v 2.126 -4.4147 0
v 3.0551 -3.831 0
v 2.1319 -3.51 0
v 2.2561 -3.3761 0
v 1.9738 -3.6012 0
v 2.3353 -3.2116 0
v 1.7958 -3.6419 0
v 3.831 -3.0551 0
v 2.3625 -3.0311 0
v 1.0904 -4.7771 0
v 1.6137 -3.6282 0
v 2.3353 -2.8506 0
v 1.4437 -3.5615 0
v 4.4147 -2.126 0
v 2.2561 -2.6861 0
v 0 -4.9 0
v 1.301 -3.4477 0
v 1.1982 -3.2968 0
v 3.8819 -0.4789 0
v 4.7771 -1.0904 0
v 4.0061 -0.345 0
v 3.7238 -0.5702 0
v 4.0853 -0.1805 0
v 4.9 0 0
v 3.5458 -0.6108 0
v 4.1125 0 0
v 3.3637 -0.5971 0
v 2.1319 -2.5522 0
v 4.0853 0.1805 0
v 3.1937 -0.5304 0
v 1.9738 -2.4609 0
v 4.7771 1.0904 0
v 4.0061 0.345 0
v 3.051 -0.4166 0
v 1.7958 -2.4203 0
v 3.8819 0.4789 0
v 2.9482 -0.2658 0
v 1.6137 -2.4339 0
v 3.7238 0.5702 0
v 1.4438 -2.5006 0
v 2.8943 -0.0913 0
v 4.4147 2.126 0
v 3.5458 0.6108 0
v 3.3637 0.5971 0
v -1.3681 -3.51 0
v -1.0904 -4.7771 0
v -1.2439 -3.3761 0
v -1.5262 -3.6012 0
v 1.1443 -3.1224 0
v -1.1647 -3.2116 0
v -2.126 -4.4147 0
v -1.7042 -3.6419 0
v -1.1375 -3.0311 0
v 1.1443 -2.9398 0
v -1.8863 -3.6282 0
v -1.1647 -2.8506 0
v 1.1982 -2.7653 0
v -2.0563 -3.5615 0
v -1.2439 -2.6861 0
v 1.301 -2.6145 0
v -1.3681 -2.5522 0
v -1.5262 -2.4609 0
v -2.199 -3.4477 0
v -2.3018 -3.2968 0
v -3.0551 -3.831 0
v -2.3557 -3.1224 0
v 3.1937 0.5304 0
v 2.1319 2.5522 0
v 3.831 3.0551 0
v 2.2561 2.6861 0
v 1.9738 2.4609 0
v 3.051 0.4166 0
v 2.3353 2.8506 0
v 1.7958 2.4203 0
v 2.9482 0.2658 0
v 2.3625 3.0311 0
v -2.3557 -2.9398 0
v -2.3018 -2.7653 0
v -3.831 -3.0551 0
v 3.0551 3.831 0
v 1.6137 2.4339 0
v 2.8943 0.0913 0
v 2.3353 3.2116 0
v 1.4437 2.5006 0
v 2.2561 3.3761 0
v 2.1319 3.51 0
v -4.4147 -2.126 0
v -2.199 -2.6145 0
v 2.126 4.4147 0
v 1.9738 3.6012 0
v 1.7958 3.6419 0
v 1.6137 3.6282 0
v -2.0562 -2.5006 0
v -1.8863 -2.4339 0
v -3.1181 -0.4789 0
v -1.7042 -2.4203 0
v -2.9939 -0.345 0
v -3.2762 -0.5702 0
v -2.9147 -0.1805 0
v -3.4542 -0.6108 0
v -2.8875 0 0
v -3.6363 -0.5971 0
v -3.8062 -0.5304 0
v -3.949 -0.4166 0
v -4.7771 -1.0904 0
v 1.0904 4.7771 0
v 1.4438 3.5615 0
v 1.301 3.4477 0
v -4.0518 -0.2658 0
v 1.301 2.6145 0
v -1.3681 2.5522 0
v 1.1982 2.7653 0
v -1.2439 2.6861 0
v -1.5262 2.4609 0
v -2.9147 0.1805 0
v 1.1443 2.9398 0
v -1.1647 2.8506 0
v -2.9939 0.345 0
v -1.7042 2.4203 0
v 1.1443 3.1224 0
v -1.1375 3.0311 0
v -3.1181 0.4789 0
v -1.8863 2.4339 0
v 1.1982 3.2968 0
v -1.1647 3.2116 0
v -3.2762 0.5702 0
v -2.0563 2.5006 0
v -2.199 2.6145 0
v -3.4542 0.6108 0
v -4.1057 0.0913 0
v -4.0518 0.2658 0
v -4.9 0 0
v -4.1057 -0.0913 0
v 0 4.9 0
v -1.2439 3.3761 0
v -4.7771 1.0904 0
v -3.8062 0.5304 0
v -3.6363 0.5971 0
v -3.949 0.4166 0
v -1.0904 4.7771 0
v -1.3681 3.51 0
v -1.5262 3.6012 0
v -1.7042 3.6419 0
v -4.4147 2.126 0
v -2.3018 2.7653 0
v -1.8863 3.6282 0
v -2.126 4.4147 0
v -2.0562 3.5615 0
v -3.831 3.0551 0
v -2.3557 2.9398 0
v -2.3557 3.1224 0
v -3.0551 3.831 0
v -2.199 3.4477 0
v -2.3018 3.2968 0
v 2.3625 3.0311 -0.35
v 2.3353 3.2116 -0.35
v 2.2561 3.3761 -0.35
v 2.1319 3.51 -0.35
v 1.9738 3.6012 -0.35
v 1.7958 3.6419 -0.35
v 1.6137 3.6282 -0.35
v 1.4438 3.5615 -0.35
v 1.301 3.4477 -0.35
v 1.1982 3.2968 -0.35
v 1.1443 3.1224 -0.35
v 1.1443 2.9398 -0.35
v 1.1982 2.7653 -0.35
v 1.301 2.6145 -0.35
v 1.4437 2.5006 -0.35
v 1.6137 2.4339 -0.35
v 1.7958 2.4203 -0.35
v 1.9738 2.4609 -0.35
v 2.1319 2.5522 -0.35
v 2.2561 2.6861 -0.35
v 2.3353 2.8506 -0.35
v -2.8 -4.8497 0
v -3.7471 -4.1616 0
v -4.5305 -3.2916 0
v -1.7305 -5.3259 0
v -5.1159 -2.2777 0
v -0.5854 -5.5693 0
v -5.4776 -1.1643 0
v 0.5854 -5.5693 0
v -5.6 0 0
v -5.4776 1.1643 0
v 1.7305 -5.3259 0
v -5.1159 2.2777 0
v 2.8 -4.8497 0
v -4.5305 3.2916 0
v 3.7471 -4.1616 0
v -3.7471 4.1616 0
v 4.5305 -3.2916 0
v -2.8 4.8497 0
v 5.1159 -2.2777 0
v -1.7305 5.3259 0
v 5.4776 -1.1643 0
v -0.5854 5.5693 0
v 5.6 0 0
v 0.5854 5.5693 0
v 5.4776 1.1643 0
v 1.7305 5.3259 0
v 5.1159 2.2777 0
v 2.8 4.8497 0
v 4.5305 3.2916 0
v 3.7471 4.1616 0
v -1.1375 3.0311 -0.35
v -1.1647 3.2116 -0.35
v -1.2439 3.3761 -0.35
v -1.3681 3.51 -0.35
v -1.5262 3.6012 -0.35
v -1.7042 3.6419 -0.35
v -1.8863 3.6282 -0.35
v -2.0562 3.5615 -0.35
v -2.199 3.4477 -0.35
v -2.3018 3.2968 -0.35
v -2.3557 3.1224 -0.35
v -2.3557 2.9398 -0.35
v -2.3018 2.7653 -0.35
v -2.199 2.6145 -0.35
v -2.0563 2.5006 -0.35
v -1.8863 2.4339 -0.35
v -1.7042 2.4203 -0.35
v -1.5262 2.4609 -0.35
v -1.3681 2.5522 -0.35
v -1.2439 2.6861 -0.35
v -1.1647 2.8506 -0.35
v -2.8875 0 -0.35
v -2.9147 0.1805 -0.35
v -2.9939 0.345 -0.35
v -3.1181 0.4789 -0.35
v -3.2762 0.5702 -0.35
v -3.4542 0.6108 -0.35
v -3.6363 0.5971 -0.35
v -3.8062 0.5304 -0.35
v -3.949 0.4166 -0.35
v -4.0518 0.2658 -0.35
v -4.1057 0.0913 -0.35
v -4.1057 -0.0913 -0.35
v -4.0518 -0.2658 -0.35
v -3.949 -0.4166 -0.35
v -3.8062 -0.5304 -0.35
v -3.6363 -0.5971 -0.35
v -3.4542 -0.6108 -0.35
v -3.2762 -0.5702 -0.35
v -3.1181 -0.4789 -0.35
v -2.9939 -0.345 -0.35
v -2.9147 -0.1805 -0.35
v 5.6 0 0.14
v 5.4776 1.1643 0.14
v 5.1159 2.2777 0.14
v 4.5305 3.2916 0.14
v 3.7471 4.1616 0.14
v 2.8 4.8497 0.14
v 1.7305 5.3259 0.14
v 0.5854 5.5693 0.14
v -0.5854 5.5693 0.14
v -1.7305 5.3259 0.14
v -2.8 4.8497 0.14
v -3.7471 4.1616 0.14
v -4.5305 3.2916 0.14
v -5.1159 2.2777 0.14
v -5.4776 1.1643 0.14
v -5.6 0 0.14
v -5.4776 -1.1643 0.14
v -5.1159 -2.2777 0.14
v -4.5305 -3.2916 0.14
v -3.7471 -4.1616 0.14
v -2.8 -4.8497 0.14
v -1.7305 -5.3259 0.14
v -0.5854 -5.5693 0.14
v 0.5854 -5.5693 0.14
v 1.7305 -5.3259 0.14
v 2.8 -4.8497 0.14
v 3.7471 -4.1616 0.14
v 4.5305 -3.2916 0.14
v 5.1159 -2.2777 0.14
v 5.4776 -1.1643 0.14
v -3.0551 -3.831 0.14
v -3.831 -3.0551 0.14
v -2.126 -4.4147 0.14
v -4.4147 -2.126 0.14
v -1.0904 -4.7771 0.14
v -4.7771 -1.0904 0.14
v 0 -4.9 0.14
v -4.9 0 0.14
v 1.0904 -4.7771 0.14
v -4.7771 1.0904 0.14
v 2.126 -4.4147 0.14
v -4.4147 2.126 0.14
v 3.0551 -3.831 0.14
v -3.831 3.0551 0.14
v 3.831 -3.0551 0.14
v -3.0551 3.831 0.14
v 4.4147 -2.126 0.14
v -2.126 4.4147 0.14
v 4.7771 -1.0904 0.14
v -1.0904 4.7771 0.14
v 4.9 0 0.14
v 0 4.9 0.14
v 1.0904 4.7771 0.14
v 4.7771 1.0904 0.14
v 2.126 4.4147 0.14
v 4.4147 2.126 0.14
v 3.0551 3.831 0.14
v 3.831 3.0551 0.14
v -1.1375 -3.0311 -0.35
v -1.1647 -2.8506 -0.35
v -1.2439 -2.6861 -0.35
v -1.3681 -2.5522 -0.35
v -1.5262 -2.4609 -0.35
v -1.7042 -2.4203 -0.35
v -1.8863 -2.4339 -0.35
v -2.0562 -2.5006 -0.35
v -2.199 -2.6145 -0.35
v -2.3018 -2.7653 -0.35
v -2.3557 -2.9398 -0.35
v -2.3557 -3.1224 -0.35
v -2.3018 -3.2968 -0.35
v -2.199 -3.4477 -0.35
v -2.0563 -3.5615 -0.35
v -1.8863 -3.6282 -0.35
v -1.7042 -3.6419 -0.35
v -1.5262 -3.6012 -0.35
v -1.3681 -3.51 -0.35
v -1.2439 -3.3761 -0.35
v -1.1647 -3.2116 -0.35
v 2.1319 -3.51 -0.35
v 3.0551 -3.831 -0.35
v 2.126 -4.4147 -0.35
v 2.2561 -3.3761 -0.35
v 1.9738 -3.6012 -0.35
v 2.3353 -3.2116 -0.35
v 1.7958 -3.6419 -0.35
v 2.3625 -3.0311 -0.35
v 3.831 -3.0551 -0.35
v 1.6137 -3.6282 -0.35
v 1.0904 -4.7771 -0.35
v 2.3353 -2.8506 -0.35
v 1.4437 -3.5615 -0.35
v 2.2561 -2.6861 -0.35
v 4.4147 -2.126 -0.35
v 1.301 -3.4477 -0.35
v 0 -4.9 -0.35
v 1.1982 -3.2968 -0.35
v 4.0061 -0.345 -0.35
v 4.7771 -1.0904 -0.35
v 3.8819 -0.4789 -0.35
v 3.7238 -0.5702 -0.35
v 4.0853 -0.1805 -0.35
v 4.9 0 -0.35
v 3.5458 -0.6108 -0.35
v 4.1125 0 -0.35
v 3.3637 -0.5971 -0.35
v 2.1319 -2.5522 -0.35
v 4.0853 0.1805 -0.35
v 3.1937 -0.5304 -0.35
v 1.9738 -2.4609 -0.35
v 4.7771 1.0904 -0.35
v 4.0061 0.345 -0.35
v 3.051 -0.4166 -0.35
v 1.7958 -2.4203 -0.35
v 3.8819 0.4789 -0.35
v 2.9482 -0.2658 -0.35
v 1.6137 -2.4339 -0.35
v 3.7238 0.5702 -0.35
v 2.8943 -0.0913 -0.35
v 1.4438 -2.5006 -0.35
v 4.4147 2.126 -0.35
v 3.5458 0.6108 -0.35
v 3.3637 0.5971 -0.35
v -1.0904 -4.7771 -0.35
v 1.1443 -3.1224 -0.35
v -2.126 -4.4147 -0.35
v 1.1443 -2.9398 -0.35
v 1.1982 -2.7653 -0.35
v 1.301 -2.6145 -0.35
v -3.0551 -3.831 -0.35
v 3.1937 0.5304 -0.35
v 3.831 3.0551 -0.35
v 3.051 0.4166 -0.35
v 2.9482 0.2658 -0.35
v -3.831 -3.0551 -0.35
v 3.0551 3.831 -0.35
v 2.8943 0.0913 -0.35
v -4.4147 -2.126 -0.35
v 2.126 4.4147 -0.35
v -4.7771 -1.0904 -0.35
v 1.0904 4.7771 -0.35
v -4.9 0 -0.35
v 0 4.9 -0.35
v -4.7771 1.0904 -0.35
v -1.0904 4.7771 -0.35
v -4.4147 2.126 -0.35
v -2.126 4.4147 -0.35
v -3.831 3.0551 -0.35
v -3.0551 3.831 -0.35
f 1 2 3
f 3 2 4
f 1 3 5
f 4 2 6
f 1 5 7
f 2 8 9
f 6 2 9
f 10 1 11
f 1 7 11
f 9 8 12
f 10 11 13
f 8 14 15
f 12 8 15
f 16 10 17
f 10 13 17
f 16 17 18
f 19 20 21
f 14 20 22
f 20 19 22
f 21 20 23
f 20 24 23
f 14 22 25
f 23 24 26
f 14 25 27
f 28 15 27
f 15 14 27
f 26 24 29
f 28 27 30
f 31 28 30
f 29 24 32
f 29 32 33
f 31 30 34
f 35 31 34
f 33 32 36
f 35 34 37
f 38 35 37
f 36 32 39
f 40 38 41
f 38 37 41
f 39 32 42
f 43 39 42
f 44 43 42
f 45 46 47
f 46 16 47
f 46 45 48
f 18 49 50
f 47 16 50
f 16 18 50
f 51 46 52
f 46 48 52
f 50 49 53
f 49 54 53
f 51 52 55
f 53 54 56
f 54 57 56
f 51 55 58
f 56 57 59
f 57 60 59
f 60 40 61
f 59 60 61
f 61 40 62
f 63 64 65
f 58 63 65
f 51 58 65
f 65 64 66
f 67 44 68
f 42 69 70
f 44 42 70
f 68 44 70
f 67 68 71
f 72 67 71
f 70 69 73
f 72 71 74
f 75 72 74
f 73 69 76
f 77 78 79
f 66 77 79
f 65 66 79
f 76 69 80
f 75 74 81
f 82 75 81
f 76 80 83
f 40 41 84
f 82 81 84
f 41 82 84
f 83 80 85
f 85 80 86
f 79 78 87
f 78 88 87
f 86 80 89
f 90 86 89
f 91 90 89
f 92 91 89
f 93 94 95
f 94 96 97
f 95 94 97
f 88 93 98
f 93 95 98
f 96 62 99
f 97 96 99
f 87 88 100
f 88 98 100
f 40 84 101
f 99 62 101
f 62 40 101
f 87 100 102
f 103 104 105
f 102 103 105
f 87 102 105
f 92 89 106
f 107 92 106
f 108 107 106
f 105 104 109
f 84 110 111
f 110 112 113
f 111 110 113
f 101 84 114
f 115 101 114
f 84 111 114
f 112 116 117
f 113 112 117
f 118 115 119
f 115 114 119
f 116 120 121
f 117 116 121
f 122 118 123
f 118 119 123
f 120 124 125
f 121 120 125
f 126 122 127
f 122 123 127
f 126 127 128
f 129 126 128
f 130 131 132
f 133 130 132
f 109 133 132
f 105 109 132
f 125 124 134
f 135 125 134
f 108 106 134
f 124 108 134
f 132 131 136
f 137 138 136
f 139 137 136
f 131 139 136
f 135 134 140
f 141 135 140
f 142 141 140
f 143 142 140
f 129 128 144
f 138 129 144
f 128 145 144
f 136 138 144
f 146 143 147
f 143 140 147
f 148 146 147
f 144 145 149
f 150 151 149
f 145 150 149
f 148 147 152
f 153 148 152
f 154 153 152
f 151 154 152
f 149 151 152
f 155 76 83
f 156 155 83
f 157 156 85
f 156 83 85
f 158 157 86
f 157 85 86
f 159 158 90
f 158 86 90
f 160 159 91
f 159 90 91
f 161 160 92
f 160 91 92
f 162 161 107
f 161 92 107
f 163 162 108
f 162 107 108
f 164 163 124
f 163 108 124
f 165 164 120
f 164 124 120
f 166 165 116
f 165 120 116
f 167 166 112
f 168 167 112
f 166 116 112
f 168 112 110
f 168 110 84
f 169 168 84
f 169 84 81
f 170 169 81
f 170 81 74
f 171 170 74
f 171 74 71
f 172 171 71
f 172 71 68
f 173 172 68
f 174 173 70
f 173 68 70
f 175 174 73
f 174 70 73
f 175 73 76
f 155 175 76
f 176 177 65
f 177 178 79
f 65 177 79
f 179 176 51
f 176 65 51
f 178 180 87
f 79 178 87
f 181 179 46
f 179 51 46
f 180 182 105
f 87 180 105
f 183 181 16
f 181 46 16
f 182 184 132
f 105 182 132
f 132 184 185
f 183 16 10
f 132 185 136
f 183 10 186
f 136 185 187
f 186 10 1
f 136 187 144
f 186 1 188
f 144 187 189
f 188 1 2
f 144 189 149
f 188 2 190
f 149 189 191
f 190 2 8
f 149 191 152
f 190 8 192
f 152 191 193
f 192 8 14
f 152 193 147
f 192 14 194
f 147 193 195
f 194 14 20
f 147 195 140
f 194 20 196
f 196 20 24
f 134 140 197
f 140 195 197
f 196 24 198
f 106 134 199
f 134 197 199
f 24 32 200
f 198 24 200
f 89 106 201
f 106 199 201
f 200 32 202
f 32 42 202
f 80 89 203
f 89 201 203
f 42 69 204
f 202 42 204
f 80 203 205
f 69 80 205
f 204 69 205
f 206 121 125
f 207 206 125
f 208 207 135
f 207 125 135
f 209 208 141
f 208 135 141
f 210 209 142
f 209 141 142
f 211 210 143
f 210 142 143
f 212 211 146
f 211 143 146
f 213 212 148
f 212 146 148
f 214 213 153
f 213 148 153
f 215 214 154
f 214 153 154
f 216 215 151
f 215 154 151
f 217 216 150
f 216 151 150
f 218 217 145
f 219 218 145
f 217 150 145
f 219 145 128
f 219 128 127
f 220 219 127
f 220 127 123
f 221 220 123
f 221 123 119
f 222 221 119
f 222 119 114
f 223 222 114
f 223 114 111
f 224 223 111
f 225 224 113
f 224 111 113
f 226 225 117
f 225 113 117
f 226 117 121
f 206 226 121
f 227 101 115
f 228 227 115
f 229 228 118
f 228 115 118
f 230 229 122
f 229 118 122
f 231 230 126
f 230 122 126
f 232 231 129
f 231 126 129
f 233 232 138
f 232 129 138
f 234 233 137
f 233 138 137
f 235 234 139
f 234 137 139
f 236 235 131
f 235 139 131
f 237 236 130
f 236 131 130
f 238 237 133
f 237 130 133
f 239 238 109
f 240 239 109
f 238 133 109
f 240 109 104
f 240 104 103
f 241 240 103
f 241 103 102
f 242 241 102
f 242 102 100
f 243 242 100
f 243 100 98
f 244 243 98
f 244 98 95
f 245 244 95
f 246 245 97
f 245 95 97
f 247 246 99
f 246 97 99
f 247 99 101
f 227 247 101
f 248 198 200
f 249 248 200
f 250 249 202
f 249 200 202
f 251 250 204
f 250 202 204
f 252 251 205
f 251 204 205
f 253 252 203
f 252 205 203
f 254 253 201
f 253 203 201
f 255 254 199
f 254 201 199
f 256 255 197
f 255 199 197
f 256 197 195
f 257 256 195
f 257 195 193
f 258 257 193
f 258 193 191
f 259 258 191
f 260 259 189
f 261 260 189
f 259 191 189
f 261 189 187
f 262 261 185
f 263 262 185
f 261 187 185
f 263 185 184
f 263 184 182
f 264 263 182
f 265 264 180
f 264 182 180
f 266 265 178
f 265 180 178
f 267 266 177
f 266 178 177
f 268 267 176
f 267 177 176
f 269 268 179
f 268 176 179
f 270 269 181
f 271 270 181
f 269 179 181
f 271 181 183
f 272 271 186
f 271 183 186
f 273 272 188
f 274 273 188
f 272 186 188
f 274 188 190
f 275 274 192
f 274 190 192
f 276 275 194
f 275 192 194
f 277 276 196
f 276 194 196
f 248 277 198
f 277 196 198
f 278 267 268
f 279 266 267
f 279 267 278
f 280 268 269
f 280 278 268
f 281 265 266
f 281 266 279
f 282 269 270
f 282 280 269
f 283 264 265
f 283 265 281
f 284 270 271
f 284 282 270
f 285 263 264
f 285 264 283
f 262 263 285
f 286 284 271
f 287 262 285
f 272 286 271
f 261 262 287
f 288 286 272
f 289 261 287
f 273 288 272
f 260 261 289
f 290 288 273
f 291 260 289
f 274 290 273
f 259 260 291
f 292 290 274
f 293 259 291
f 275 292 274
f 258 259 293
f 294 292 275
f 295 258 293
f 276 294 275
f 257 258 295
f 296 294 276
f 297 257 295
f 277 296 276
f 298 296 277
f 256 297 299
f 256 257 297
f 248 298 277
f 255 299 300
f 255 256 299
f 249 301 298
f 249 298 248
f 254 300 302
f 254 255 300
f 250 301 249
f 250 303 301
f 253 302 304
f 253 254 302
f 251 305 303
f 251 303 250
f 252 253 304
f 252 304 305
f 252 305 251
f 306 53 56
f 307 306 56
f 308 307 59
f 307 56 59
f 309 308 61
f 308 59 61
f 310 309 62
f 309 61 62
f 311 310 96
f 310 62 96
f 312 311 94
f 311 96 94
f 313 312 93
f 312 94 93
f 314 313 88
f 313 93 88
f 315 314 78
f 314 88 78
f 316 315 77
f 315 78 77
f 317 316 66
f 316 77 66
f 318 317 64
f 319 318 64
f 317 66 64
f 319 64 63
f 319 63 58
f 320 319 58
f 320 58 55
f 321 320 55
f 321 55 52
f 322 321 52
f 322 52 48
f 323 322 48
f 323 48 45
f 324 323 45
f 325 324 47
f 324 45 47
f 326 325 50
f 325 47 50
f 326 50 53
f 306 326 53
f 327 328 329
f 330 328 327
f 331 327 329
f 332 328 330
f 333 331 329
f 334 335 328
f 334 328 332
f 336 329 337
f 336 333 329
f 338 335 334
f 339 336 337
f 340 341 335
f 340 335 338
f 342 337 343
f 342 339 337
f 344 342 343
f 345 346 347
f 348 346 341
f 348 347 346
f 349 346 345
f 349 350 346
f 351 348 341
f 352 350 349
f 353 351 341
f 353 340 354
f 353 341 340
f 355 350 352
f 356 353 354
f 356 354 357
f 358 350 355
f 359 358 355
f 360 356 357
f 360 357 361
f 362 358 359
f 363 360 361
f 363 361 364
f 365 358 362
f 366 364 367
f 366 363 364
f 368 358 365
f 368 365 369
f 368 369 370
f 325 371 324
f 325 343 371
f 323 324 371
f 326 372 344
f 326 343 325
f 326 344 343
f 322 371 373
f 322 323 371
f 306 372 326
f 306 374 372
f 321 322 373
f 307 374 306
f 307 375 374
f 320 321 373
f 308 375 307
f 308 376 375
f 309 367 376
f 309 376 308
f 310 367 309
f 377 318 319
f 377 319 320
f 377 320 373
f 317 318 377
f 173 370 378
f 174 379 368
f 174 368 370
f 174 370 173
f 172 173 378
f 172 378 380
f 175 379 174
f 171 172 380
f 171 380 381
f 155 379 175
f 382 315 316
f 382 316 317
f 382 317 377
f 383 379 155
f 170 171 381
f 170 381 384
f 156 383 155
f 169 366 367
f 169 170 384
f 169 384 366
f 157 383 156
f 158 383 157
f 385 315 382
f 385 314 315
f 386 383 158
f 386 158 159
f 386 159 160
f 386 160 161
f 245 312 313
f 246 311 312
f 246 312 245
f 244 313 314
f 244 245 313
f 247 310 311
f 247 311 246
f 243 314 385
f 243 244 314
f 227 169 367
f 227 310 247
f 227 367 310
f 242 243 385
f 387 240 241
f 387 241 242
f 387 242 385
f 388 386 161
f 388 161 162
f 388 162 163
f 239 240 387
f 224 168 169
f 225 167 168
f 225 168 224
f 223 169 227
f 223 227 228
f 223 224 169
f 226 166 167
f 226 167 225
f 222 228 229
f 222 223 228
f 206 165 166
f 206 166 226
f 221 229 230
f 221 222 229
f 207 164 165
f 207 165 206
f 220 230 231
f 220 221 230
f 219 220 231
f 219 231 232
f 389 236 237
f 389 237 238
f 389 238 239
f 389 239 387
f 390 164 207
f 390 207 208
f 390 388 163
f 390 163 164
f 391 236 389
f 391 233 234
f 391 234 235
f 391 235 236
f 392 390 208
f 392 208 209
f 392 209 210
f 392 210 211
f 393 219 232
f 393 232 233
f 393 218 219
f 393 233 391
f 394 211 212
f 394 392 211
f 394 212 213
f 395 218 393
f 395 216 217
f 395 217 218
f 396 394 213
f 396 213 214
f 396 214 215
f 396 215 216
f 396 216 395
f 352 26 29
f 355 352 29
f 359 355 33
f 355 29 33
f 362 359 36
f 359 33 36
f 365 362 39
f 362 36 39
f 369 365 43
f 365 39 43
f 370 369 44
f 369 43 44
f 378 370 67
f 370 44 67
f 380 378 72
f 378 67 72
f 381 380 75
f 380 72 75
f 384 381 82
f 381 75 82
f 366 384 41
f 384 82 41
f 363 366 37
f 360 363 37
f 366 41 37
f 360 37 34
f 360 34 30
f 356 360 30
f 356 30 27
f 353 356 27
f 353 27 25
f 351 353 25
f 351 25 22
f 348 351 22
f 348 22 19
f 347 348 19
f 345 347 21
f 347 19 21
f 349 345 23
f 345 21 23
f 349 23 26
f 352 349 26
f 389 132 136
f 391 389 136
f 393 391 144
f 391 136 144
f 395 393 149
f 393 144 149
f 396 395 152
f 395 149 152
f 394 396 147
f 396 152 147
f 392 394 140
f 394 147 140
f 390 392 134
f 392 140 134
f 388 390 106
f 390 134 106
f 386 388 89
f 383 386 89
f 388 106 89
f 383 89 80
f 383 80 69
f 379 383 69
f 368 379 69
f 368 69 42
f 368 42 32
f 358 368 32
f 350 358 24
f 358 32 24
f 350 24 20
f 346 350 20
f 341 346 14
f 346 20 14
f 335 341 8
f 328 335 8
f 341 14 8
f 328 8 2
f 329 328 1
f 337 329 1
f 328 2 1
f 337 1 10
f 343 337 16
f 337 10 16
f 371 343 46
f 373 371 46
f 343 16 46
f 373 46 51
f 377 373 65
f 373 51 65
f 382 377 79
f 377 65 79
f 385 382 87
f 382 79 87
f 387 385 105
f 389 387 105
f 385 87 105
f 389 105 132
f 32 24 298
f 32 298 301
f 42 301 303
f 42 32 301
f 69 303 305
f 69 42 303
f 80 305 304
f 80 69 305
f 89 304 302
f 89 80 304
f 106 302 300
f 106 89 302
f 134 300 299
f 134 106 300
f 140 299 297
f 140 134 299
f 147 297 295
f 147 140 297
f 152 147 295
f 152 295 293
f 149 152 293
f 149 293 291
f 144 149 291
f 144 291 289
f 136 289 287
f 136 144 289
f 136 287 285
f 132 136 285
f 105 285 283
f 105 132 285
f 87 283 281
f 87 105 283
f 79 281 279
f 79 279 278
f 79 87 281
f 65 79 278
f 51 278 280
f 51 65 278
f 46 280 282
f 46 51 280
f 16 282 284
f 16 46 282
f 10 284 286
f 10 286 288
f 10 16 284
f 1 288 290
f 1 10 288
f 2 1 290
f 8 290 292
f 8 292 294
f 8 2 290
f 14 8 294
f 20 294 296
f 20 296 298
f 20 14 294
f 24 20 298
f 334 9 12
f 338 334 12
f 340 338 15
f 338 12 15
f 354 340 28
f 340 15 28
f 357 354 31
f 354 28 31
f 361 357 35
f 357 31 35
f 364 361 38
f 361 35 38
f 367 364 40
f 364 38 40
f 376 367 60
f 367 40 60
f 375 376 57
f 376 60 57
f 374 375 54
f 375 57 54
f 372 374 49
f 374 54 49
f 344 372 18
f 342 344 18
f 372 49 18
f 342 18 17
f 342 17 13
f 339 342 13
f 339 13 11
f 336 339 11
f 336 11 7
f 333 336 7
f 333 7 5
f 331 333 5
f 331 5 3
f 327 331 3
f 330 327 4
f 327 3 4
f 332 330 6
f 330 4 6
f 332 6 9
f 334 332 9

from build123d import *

# Parameters (mm, degrees)
SKETCH_1_R          = 16
SKETCH_1_R_2        = 14
EXTRUDE_1_DEPTH     = 0.4
SKETCH_2_R          = 14
EXTRUDE_1_2_DEPTH   = 1
SKETCH_3_R          = 1.75
CUT_EXTRUDE_1_DEPTH = 1
SCALE_1_SCALE       = 0.35


with BuildPart() as part:
    # 草图1 → Extrude 1 (new body)
    with BuildSketch(Plane.XY):
        Circle(SKETCH_1_R)
        Circle(SKETCH_1_R_2, mode=Mode.SUBTRACT)
    extrude(amount=EXTRUDE_1_DEPTH)


with BuildPart() as body_2:
    # 草图2 → Extrude 1 2 (new body)
    with BuildSketch(Plane(origin=(0, 0, 0), x_dir=(-1, 0, 0), z_dir=(0, 0, -1))):
        Circle(SKETCH_2_R)
    extrude(amount=EXTRUDE_1_2_DEPTH)

    # 草图3 → 切除-拉伸1 (cut)
    with BuildSketch(Plane.XY):
        with Locations((10, 0)):
            Circle(SKETCH_3_R)
        with Locations((5, -8.660254038)):
            Circle(SKETCH_3_R)
        with Locations((-5, -8.660254038)):
            Circle(SKETCH_3_R)
        with Locations((-10, 0)):
            Circle(SKETCH_3_R)
        with Locations((-5, 8.660254038)):
            Circle(SKETCH_3_R)
        with Locations((5, 8.660254038)):
            Circle(SKETCH_3_R)
    extrude(amount=-CUT_EXTRUDE_1_DEPTH, mode=Mode.SUBTRACT)


with BuildPart() as part_1:
    # 缩放比例1: scaled about (0, 0, 0)
    add(part.part.scale(SCALE_1_SCALE))


with BuildPart() as body_2_1:
    # 缩放比例1: scaled about (0, 0, 0)
    add(body_2.part.scale(SCALE_1_SCALE))


solid = Compound([part_1.part, body_2_1.part])
